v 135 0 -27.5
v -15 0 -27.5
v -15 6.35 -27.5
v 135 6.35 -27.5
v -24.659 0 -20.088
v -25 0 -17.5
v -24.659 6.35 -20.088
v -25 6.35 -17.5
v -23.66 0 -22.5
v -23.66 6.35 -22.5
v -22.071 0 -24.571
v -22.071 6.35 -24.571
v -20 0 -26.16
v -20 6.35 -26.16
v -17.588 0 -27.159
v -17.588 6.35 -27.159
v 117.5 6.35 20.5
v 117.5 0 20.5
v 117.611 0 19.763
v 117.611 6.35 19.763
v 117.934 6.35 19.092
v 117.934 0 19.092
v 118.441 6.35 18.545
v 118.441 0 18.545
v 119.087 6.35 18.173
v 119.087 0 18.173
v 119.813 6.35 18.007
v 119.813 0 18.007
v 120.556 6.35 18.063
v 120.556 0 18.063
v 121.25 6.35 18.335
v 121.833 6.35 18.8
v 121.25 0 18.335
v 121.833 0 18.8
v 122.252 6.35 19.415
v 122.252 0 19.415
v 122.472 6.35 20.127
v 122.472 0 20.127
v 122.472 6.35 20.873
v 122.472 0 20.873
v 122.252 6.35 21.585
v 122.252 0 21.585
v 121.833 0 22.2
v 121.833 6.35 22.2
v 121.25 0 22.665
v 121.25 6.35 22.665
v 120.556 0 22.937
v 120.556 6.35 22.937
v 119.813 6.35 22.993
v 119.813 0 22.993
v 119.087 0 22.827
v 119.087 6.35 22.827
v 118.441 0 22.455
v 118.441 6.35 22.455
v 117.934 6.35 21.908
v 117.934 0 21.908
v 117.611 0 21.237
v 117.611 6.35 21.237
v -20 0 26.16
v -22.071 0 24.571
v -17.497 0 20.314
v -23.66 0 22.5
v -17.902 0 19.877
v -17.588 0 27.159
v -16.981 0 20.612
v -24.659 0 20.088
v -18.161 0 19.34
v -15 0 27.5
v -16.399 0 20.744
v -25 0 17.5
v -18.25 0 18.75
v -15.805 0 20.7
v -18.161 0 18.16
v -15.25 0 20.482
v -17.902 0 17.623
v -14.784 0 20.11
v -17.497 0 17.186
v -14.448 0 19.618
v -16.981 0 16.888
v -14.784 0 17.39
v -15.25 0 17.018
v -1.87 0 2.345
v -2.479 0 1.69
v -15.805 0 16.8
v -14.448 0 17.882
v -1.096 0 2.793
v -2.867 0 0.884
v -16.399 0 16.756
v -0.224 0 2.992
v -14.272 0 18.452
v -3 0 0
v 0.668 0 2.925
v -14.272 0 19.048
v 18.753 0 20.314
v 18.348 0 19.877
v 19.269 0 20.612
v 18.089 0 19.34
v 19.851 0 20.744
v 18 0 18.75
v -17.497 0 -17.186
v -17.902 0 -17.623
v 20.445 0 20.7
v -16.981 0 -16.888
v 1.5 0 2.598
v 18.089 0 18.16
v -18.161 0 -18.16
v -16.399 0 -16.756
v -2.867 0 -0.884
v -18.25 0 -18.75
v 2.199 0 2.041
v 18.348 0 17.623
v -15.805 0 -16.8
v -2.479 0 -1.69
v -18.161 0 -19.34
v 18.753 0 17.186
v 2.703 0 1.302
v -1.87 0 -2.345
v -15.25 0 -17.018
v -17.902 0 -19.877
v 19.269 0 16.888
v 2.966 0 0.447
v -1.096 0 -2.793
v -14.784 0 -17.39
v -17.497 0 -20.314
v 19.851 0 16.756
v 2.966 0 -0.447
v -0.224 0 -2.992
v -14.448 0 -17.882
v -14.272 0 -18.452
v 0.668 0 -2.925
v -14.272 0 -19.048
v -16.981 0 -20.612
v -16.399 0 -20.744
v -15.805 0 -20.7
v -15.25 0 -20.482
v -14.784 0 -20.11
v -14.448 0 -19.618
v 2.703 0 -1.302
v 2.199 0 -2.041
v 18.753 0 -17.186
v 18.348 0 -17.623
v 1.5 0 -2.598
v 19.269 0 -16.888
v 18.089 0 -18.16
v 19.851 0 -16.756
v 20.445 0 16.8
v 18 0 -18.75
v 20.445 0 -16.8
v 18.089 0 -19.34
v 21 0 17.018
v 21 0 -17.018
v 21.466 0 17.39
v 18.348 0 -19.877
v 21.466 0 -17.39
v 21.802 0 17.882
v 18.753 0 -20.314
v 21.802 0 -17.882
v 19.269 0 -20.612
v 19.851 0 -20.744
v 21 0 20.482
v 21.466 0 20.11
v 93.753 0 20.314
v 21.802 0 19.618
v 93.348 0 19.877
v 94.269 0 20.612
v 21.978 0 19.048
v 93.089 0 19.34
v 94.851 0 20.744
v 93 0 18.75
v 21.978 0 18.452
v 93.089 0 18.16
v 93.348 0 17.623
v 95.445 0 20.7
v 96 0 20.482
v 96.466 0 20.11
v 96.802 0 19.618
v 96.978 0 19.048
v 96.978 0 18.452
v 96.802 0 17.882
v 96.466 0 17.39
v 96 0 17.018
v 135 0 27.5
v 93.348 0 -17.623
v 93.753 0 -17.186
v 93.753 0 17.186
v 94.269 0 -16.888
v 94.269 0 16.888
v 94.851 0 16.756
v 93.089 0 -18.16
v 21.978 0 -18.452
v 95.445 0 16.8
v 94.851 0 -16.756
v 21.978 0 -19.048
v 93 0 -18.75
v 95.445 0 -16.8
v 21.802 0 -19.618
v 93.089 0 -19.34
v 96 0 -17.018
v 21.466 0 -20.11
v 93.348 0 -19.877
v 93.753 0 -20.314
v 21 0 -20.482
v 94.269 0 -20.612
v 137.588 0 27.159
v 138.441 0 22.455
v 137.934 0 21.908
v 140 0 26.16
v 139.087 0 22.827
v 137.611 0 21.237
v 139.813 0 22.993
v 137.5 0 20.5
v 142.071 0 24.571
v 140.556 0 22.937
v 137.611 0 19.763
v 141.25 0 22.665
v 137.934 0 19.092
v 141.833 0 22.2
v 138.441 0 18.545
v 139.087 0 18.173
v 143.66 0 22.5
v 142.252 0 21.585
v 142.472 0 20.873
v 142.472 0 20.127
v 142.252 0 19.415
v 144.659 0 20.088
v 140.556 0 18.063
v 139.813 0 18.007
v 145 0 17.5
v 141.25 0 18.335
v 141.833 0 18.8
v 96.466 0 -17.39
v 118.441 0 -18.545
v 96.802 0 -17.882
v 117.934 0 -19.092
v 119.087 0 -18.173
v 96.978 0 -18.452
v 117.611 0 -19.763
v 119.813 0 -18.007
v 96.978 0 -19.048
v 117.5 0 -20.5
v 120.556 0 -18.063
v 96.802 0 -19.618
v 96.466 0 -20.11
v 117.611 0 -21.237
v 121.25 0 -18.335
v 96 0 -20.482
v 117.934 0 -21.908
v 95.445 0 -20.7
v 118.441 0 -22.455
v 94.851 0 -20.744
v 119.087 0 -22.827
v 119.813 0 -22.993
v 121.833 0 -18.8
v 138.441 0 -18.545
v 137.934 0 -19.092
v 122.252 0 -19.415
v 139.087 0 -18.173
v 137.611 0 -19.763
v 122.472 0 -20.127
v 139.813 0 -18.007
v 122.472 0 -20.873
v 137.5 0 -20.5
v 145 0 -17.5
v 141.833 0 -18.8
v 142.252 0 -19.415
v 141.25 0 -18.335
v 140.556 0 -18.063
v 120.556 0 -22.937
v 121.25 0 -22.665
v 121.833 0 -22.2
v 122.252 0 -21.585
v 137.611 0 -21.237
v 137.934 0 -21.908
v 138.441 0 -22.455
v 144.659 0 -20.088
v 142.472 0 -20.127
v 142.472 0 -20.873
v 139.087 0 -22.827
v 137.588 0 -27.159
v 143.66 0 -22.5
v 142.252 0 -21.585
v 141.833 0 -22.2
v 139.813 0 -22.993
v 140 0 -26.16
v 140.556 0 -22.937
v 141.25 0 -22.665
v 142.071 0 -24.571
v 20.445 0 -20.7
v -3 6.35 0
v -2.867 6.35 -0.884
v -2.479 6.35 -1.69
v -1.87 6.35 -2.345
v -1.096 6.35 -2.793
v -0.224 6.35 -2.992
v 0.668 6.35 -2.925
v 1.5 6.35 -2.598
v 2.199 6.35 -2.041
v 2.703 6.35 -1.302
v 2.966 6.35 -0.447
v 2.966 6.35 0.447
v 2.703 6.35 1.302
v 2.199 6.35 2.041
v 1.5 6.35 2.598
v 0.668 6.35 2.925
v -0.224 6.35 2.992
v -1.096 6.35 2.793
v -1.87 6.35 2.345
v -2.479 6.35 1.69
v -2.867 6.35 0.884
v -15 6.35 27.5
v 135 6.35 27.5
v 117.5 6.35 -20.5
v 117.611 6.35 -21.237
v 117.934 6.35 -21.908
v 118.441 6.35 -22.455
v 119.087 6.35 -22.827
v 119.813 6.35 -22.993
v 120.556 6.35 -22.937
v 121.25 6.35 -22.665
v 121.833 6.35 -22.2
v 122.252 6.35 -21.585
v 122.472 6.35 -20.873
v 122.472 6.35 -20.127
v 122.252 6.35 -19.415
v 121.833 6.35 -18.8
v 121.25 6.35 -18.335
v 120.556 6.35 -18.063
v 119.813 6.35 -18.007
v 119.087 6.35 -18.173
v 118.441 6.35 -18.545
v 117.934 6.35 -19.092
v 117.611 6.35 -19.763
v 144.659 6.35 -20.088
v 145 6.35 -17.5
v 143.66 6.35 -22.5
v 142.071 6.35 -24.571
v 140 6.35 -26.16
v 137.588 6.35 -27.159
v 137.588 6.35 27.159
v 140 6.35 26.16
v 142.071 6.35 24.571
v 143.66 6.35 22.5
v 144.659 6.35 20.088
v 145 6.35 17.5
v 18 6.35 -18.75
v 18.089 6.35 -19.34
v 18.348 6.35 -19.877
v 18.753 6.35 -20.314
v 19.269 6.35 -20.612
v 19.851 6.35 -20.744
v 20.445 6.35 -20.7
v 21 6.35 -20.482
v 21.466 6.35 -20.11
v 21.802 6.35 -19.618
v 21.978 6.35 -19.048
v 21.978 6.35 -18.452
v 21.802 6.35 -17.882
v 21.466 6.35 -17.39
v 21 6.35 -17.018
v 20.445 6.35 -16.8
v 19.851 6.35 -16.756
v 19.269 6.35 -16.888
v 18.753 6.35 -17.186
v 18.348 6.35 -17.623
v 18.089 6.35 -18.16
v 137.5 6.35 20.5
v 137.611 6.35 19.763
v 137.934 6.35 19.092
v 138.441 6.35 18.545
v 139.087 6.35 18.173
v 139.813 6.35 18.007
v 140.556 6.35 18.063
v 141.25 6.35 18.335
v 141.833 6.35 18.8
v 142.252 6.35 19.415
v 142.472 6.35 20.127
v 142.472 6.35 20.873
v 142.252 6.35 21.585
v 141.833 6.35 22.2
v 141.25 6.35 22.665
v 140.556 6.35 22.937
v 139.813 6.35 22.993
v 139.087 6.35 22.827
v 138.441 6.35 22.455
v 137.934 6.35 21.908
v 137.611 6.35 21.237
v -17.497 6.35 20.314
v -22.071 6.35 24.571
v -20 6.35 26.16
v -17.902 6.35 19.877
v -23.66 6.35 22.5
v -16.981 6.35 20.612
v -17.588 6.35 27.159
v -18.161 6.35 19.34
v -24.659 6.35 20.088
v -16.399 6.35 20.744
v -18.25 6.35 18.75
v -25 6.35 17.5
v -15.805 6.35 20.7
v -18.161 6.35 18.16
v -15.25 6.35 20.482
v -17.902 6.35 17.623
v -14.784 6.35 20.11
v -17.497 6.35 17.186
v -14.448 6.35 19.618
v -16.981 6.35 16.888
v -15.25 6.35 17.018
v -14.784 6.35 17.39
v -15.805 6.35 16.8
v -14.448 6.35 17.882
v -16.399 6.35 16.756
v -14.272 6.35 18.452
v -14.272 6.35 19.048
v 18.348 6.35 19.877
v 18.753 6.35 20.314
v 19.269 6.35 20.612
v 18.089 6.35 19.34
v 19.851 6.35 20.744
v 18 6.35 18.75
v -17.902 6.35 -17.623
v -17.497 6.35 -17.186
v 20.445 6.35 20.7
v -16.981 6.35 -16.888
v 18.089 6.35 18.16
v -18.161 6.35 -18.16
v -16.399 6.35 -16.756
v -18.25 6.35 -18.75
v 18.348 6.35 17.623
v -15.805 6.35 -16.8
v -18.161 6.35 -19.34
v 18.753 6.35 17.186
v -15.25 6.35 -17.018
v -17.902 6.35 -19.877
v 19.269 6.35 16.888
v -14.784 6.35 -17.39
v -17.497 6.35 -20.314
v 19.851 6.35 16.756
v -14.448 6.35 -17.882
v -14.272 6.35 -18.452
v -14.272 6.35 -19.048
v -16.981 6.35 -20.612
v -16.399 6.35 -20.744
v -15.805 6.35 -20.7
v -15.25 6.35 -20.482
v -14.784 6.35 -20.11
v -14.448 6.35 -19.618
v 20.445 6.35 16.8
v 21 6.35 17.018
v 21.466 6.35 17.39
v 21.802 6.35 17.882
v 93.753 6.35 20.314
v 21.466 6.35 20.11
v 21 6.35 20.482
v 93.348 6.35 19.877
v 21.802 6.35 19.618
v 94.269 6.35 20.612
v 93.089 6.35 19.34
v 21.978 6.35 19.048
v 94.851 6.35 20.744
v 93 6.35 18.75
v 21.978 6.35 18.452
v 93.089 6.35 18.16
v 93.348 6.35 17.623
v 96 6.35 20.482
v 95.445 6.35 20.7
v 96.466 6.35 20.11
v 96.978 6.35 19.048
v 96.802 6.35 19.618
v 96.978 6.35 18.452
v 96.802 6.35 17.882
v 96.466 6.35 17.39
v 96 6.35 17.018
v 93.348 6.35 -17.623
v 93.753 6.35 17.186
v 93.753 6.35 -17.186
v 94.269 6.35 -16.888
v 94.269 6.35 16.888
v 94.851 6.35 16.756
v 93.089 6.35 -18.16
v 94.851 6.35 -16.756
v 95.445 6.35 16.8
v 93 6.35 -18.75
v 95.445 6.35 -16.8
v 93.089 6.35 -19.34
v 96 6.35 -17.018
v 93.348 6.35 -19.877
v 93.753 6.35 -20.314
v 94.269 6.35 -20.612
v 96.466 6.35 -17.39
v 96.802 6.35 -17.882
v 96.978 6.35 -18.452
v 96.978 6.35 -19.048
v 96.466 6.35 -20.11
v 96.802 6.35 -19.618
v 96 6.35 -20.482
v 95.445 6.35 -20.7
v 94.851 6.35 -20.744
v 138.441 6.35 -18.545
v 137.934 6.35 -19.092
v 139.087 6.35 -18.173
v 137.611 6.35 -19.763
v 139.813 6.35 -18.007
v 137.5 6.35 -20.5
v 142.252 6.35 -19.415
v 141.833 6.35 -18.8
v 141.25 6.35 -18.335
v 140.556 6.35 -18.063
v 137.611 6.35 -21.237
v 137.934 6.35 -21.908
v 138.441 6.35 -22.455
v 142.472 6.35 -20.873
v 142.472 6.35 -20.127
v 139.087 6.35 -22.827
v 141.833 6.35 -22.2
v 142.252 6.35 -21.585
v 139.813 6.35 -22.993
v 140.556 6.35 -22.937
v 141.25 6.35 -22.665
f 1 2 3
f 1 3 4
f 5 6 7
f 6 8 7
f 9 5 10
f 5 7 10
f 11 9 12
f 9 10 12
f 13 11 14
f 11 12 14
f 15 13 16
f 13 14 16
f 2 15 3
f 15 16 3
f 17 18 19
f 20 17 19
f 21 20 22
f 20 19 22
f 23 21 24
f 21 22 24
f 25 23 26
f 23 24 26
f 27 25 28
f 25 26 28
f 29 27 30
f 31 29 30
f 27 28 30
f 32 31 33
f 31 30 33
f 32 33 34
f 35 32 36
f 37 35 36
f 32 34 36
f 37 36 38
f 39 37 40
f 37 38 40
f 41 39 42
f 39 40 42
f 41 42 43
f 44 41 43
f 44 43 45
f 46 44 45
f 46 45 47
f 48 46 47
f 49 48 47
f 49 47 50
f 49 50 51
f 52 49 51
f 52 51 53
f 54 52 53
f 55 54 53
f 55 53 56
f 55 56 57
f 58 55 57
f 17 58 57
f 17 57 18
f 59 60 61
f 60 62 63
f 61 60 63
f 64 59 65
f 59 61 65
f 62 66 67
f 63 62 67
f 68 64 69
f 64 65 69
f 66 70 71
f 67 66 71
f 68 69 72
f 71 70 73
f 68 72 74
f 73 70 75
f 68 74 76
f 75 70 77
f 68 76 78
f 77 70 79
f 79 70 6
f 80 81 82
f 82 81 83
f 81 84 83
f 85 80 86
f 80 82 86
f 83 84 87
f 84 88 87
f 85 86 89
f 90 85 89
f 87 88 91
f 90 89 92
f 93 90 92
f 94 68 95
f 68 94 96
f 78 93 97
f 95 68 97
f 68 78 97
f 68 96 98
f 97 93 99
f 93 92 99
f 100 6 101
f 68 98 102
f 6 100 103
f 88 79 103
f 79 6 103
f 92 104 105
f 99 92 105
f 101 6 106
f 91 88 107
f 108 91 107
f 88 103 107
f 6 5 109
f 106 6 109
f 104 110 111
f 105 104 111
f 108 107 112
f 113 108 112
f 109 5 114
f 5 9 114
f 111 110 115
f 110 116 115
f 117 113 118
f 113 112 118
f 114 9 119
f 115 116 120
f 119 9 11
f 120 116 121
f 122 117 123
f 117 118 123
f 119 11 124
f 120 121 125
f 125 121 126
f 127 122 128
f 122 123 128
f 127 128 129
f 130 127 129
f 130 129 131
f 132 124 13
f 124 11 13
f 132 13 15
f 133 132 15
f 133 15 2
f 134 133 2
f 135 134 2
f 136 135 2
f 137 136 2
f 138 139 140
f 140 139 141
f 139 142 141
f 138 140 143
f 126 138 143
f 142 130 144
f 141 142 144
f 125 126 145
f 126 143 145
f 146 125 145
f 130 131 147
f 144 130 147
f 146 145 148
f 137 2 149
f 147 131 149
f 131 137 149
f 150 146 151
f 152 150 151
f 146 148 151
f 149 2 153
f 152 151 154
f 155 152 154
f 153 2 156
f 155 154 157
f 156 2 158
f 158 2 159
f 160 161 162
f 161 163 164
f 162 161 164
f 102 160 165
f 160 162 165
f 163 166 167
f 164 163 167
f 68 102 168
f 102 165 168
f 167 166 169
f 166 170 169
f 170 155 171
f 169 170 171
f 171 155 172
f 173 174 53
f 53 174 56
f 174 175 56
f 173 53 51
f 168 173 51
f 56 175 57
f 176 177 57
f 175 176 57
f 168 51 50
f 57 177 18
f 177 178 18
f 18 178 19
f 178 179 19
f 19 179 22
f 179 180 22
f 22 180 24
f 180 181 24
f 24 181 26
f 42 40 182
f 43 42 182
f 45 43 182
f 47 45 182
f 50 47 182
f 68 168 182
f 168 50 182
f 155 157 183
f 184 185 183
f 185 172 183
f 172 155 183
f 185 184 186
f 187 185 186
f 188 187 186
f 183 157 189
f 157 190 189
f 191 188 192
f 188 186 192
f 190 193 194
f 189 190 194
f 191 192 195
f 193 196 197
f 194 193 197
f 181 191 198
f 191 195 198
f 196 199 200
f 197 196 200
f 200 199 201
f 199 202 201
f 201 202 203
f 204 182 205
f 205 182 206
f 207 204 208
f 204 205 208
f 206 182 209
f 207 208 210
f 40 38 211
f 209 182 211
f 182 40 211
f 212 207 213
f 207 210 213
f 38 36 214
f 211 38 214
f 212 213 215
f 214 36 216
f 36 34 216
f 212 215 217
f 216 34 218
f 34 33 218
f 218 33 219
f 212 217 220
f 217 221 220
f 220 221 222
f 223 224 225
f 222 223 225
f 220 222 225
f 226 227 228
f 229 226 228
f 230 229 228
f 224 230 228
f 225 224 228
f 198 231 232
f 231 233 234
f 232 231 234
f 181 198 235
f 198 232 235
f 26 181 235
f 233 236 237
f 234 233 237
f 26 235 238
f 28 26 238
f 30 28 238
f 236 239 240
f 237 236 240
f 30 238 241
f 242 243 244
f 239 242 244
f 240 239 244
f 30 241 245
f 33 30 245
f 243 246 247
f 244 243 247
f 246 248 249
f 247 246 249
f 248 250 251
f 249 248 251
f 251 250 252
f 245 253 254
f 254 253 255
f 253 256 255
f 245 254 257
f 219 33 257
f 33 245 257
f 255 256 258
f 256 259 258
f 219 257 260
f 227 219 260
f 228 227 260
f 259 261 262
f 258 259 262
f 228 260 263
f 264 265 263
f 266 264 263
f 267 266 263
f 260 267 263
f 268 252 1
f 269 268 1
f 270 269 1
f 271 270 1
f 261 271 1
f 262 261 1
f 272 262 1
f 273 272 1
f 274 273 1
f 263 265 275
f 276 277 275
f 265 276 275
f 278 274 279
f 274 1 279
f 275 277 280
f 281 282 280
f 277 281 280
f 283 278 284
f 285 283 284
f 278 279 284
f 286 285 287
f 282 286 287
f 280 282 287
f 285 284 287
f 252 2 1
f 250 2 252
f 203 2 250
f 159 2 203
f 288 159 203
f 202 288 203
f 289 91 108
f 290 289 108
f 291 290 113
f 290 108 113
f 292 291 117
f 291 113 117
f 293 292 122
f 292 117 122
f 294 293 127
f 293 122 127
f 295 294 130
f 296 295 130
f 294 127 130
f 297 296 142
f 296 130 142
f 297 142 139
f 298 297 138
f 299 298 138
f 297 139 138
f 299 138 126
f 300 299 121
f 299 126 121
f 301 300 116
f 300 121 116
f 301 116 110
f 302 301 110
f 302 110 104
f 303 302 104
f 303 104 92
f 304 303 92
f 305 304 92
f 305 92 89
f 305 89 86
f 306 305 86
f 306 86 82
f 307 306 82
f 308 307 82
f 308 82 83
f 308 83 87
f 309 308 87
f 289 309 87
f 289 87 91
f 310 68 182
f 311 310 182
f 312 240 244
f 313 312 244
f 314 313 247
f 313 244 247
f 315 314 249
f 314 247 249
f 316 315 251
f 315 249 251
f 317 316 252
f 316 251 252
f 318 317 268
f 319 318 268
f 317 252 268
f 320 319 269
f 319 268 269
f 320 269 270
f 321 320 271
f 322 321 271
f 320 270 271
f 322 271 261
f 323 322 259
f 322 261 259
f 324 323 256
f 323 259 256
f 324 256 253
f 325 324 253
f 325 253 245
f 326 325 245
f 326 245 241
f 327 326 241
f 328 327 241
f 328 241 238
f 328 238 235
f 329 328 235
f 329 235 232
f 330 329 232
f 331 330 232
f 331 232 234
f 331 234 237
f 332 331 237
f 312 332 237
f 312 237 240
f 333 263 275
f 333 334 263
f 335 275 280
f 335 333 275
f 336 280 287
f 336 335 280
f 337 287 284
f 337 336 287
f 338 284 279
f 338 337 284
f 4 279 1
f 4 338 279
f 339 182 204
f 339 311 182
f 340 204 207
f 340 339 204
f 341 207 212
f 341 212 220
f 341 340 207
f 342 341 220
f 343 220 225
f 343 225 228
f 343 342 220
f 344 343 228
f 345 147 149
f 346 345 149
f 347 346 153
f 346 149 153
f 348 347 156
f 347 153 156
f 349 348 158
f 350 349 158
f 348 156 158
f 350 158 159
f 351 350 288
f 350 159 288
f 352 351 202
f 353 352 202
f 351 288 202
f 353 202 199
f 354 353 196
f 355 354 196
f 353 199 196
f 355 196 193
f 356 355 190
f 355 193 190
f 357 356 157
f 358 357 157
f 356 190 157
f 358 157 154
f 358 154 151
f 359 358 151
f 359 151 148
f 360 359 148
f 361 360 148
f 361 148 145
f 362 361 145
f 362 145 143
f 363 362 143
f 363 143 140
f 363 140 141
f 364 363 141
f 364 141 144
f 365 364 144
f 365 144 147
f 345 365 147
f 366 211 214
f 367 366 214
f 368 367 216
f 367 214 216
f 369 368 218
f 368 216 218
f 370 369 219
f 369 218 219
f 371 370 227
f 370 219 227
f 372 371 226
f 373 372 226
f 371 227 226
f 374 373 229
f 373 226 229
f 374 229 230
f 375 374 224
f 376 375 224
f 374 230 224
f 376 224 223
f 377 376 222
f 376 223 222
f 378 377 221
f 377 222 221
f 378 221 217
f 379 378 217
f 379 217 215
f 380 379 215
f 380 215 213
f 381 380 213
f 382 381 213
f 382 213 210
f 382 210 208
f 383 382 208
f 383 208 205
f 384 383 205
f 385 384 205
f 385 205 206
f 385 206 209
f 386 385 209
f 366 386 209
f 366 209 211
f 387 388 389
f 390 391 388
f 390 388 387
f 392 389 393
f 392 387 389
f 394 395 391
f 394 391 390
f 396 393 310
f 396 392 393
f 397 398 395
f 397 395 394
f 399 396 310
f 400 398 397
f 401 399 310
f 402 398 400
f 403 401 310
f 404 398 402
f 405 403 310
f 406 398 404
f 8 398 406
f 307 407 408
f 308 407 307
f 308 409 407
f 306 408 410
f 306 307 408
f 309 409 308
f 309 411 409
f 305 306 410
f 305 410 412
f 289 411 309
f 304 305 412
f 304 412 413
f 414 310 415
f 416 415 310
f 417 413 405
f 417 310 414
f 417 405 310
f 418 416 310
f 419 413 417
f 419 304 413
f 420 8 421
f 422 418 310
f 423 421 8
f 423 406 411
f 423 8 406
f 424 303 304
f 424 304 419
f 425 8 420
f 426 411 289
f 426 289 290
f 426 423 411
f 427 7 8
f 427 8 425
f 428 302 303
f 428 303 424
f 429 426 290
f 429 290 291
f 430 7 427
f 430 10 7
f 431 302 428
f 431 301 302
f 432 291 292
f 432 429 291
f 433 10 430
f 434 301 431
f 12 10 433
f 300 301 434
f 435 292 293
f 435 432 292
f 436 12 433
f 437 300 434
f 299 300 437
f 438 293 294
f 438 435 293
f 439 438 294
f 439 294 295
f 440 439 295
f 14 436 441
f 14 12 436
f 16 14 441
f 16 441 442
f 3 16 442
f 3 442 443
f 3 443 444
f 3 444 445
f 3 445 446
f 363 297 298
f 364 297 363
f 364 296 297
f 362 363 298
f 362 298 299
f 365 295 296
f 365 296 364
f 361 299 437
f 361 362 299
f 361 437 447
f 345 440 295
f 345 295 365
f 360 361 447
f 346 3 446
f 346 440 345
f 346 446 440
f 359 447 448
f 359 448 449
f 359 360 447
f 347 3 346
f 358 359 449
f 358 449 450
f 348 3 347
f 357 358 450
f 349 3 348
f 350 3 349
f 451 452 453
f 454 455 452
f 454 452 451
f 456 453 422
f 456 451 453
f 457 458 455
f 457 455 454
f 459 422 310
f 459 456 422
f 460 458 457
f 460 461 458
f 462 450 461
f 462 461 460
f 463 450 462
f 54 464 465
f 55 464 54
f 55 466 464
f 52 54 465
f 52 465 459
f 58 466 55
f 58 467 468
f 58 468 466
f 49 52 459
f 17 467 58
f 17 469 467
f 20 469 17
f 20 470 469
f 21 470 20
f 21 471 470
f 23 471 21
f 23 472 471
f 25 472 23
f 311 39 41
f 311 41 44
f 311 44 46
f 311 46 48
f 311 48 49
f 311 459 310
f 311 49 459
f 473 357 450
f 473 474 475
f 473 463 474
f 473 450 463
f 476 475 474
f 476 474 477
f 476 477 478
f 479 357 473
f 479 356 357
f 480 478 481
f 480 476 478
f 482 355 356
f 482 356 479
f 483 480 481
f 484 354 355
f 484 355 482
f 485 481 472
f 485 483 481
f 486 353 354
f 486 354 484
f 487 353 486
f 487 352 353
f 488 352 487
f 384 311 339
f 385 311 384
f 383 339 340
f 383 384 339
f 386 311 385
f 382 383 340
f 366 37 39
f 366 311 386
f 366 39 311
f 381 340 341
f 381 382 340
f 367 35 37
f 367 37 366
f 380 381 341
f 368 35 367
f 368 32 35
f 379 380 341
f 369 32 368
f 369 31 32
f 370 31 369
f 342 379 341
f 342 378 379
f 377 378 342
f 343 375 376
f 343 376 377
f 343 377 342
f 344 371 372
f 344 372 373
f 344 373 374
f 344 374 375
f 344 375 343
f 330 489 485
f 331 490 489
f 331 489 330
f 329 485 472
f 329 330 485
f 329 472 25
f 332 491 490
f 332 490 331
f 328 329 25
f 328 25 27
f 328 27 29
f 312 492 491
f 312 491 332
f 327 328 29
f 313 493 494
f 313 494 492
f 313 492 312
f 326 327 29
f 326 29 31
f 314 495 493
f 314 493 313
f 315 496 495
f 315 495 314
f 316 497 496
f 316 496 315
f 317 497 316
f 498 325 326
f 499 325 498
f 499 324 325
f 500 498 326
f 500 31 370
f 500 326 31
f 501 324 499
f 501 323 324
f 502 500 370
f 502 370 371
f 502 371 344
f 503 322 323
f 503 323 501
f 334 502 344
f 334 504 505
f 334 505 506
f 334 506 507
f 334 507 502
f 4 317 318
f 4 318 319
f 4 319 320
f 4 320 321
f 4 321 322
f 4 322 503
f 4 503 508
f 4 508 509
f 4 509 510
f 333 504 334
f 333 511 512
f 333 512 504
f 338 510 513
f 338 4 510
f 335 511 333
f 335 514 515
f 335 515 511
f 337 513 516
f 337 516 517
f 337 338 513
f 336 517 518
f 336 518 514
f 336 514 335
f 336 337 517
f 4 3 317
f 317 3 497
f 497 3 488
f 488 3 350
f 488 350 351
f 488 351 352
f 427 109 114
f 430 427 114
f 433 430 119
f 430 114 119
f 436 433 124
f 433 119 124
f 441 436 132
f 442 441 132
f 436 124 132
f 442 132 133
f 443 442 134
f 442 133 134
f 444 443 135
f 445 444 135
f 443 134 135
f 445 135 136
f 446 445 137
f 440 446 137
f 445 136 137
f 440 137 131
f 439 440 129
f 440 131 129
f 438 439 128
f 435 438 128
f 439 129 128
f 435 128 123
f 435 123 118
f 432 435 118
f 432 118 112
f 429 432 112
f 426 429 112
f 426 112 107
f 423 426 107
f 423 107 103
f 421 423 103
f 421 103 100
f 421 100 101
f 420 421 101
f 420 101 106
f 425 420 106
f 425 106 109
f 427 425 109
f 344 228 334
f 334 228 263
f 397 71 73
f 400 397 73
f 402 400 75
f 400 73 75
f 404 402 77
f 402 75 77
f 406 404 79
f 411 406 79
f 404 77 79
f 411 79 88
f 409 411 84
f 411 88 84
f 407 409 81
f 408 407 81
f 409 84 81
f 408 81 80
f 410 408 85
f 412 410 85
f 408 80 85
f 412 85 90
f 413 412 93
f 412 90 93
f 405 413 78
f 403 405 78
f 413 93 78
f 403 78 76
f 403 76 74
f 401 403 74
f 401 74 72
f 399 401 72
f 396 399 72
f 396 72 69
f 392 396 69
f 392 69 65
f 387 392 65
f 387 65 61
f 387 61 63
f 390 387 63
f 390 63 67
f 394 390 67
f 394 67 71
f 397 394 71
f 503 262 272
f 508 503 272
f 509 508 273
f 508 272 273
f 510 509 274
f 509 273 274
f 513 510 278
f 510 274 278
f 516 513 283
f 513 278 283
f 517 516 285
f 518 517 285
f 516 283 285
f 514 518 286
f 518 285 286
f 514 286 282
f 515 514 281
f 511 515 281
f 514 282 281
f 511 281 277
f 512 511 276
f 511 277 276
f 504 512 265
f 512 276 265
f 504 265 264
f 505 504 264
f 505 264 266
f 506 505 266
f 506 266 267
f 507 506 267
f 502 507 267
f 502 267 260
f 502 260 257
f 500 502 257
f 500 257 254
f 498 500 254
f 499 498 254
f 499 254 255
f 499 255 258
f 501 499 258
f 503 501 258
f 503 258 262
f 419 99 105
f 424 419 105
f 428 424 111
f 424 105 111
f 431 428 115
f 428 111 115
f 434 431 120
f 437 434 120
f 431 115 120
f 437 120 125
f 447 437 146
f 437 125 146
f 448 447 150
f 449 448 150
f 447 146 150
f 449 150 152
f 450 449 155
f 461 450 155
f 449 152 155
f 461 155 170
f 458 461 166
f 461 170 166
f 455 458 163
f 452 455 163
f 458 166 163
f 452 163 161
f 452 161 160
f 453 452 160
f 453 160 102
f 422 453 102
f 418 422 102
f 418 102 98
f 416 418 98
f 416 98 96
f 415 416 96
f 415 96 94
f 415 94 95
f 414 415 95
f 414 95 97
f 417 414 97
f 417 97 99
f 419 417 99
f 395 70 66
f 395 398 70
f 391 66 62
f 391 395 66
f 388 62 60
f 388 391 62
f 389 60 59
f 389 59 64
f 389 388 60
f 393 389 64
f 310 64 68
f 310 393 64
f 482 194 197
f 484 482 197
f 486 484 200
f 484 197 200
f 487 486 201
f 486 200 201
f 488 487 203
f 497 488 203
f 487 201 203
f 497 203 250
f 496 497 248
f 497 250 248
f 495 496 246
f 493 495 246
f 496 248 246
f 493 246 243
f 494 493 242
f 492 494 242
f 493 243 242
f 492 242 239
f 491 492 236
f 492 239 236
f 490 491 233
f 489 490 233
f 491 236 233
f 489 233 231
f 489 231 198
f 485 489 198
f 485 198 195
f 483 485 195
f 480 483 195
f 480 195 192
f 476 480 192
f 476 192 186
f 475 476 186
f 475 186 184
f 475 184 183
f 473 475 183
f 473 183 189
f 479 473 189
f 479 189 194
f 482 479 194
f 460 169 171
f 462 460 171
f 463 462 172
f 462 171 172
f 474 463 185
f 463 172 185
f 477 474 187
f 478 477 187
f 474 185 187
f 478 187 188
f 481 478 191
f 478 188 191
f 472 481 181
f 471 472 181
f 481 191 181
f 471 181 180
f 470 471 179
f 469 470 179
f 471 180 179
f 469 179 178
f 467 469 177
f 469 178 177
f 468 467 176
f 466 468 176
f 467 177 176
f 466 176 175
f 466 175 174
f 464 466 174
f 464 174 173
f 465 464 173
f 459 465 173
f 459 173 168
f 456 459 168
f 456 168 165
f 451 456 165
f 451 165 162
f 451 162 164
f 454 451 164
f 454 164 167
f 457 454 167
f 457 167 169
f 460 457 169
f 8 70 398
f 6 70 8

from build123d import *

# Parameters (mm, degrees)
SKETCH1_W                 = 170
SKETCH1_H                 = 55
BOSS_EXTRUDE1_DEPTH       = 6.35
FILLET1_R                 = 10
F_6_0MM_DOWEL_HOLE1_D     = 6
F_4_0MM_DOWEL_HOLE1_D     = 4
F_4_0MM_DOWEL_HOLE1_DEPTH = 6.35
F_5_0MM_DOWEL_HOLE1_D     = 5


with BuildPart() as part:
    # Sketch1 → Boss-Extrude1 (new body)
    with BuildSketch(Plane(origin=(0, 0, 0), x_dir=(1, 0, 0), z_dir=(0, 1, 0))):
        with Locations((60, 0)):
            Rectangle(SKETCH1_W, SKETCH1_H)
    extrude(amount=BOSS_EXTRUDE1_DEPTH)

    # Fillet1
    fillet1_edges = [part.edges().sort_by_distance(p)[0] for p in [
        (-25, 3.175, -27.5),
        (145, 3.175, -27.5),
        (145, 3.175, 27.5),
        (-25, 3.175, 27.5),
    ]]
    fillet(fillet1_edges, radius=FILLET1_R)

    # Ø6.0mm Dowel Hole1 (through all)
    with Locations(Plane(origin=(0, 6.35, 0), x_dir=(1, 0, 0), z_dir=(0, 1, 0))):
        with Locations((0, 0)):
            Hole(F_6_0MM_DOWEL_HOLE1_D / 2)

    # Ø4.0mm Dowel Hole1
    with Locations(Plane(origin=(0, 6.35, 0), x_dir=(1, 0, 0), z_dir=(0, 1, 0))):
        with Locations((-16.25, -18.75), (20, -18.75), (95, -18.75), (170, -18.75), (170, 18.75), (95, 18.75), (20, 18.75), (-16.25, 18.75)):
            Hole(F_4_0MM_DOWEL_HOLE1_D / 2, depth=F_4_0MM_DOWEL_HOLE1_DEPTH)

    # Ø5.0mm Dowel Hole1 (through all)
    with Locations(Plane(origin=(0, 6.35, 0), x_dir=(1, 0, 0), z_dir=(0, 1, 0))):
        with Locations((140, 20.5), (120, 20.5), (140, -20.5), (120, -20.5)):
            Hole(F_5_0MM_DOWEL_HOLE1_D / 2)


solid = part.part
